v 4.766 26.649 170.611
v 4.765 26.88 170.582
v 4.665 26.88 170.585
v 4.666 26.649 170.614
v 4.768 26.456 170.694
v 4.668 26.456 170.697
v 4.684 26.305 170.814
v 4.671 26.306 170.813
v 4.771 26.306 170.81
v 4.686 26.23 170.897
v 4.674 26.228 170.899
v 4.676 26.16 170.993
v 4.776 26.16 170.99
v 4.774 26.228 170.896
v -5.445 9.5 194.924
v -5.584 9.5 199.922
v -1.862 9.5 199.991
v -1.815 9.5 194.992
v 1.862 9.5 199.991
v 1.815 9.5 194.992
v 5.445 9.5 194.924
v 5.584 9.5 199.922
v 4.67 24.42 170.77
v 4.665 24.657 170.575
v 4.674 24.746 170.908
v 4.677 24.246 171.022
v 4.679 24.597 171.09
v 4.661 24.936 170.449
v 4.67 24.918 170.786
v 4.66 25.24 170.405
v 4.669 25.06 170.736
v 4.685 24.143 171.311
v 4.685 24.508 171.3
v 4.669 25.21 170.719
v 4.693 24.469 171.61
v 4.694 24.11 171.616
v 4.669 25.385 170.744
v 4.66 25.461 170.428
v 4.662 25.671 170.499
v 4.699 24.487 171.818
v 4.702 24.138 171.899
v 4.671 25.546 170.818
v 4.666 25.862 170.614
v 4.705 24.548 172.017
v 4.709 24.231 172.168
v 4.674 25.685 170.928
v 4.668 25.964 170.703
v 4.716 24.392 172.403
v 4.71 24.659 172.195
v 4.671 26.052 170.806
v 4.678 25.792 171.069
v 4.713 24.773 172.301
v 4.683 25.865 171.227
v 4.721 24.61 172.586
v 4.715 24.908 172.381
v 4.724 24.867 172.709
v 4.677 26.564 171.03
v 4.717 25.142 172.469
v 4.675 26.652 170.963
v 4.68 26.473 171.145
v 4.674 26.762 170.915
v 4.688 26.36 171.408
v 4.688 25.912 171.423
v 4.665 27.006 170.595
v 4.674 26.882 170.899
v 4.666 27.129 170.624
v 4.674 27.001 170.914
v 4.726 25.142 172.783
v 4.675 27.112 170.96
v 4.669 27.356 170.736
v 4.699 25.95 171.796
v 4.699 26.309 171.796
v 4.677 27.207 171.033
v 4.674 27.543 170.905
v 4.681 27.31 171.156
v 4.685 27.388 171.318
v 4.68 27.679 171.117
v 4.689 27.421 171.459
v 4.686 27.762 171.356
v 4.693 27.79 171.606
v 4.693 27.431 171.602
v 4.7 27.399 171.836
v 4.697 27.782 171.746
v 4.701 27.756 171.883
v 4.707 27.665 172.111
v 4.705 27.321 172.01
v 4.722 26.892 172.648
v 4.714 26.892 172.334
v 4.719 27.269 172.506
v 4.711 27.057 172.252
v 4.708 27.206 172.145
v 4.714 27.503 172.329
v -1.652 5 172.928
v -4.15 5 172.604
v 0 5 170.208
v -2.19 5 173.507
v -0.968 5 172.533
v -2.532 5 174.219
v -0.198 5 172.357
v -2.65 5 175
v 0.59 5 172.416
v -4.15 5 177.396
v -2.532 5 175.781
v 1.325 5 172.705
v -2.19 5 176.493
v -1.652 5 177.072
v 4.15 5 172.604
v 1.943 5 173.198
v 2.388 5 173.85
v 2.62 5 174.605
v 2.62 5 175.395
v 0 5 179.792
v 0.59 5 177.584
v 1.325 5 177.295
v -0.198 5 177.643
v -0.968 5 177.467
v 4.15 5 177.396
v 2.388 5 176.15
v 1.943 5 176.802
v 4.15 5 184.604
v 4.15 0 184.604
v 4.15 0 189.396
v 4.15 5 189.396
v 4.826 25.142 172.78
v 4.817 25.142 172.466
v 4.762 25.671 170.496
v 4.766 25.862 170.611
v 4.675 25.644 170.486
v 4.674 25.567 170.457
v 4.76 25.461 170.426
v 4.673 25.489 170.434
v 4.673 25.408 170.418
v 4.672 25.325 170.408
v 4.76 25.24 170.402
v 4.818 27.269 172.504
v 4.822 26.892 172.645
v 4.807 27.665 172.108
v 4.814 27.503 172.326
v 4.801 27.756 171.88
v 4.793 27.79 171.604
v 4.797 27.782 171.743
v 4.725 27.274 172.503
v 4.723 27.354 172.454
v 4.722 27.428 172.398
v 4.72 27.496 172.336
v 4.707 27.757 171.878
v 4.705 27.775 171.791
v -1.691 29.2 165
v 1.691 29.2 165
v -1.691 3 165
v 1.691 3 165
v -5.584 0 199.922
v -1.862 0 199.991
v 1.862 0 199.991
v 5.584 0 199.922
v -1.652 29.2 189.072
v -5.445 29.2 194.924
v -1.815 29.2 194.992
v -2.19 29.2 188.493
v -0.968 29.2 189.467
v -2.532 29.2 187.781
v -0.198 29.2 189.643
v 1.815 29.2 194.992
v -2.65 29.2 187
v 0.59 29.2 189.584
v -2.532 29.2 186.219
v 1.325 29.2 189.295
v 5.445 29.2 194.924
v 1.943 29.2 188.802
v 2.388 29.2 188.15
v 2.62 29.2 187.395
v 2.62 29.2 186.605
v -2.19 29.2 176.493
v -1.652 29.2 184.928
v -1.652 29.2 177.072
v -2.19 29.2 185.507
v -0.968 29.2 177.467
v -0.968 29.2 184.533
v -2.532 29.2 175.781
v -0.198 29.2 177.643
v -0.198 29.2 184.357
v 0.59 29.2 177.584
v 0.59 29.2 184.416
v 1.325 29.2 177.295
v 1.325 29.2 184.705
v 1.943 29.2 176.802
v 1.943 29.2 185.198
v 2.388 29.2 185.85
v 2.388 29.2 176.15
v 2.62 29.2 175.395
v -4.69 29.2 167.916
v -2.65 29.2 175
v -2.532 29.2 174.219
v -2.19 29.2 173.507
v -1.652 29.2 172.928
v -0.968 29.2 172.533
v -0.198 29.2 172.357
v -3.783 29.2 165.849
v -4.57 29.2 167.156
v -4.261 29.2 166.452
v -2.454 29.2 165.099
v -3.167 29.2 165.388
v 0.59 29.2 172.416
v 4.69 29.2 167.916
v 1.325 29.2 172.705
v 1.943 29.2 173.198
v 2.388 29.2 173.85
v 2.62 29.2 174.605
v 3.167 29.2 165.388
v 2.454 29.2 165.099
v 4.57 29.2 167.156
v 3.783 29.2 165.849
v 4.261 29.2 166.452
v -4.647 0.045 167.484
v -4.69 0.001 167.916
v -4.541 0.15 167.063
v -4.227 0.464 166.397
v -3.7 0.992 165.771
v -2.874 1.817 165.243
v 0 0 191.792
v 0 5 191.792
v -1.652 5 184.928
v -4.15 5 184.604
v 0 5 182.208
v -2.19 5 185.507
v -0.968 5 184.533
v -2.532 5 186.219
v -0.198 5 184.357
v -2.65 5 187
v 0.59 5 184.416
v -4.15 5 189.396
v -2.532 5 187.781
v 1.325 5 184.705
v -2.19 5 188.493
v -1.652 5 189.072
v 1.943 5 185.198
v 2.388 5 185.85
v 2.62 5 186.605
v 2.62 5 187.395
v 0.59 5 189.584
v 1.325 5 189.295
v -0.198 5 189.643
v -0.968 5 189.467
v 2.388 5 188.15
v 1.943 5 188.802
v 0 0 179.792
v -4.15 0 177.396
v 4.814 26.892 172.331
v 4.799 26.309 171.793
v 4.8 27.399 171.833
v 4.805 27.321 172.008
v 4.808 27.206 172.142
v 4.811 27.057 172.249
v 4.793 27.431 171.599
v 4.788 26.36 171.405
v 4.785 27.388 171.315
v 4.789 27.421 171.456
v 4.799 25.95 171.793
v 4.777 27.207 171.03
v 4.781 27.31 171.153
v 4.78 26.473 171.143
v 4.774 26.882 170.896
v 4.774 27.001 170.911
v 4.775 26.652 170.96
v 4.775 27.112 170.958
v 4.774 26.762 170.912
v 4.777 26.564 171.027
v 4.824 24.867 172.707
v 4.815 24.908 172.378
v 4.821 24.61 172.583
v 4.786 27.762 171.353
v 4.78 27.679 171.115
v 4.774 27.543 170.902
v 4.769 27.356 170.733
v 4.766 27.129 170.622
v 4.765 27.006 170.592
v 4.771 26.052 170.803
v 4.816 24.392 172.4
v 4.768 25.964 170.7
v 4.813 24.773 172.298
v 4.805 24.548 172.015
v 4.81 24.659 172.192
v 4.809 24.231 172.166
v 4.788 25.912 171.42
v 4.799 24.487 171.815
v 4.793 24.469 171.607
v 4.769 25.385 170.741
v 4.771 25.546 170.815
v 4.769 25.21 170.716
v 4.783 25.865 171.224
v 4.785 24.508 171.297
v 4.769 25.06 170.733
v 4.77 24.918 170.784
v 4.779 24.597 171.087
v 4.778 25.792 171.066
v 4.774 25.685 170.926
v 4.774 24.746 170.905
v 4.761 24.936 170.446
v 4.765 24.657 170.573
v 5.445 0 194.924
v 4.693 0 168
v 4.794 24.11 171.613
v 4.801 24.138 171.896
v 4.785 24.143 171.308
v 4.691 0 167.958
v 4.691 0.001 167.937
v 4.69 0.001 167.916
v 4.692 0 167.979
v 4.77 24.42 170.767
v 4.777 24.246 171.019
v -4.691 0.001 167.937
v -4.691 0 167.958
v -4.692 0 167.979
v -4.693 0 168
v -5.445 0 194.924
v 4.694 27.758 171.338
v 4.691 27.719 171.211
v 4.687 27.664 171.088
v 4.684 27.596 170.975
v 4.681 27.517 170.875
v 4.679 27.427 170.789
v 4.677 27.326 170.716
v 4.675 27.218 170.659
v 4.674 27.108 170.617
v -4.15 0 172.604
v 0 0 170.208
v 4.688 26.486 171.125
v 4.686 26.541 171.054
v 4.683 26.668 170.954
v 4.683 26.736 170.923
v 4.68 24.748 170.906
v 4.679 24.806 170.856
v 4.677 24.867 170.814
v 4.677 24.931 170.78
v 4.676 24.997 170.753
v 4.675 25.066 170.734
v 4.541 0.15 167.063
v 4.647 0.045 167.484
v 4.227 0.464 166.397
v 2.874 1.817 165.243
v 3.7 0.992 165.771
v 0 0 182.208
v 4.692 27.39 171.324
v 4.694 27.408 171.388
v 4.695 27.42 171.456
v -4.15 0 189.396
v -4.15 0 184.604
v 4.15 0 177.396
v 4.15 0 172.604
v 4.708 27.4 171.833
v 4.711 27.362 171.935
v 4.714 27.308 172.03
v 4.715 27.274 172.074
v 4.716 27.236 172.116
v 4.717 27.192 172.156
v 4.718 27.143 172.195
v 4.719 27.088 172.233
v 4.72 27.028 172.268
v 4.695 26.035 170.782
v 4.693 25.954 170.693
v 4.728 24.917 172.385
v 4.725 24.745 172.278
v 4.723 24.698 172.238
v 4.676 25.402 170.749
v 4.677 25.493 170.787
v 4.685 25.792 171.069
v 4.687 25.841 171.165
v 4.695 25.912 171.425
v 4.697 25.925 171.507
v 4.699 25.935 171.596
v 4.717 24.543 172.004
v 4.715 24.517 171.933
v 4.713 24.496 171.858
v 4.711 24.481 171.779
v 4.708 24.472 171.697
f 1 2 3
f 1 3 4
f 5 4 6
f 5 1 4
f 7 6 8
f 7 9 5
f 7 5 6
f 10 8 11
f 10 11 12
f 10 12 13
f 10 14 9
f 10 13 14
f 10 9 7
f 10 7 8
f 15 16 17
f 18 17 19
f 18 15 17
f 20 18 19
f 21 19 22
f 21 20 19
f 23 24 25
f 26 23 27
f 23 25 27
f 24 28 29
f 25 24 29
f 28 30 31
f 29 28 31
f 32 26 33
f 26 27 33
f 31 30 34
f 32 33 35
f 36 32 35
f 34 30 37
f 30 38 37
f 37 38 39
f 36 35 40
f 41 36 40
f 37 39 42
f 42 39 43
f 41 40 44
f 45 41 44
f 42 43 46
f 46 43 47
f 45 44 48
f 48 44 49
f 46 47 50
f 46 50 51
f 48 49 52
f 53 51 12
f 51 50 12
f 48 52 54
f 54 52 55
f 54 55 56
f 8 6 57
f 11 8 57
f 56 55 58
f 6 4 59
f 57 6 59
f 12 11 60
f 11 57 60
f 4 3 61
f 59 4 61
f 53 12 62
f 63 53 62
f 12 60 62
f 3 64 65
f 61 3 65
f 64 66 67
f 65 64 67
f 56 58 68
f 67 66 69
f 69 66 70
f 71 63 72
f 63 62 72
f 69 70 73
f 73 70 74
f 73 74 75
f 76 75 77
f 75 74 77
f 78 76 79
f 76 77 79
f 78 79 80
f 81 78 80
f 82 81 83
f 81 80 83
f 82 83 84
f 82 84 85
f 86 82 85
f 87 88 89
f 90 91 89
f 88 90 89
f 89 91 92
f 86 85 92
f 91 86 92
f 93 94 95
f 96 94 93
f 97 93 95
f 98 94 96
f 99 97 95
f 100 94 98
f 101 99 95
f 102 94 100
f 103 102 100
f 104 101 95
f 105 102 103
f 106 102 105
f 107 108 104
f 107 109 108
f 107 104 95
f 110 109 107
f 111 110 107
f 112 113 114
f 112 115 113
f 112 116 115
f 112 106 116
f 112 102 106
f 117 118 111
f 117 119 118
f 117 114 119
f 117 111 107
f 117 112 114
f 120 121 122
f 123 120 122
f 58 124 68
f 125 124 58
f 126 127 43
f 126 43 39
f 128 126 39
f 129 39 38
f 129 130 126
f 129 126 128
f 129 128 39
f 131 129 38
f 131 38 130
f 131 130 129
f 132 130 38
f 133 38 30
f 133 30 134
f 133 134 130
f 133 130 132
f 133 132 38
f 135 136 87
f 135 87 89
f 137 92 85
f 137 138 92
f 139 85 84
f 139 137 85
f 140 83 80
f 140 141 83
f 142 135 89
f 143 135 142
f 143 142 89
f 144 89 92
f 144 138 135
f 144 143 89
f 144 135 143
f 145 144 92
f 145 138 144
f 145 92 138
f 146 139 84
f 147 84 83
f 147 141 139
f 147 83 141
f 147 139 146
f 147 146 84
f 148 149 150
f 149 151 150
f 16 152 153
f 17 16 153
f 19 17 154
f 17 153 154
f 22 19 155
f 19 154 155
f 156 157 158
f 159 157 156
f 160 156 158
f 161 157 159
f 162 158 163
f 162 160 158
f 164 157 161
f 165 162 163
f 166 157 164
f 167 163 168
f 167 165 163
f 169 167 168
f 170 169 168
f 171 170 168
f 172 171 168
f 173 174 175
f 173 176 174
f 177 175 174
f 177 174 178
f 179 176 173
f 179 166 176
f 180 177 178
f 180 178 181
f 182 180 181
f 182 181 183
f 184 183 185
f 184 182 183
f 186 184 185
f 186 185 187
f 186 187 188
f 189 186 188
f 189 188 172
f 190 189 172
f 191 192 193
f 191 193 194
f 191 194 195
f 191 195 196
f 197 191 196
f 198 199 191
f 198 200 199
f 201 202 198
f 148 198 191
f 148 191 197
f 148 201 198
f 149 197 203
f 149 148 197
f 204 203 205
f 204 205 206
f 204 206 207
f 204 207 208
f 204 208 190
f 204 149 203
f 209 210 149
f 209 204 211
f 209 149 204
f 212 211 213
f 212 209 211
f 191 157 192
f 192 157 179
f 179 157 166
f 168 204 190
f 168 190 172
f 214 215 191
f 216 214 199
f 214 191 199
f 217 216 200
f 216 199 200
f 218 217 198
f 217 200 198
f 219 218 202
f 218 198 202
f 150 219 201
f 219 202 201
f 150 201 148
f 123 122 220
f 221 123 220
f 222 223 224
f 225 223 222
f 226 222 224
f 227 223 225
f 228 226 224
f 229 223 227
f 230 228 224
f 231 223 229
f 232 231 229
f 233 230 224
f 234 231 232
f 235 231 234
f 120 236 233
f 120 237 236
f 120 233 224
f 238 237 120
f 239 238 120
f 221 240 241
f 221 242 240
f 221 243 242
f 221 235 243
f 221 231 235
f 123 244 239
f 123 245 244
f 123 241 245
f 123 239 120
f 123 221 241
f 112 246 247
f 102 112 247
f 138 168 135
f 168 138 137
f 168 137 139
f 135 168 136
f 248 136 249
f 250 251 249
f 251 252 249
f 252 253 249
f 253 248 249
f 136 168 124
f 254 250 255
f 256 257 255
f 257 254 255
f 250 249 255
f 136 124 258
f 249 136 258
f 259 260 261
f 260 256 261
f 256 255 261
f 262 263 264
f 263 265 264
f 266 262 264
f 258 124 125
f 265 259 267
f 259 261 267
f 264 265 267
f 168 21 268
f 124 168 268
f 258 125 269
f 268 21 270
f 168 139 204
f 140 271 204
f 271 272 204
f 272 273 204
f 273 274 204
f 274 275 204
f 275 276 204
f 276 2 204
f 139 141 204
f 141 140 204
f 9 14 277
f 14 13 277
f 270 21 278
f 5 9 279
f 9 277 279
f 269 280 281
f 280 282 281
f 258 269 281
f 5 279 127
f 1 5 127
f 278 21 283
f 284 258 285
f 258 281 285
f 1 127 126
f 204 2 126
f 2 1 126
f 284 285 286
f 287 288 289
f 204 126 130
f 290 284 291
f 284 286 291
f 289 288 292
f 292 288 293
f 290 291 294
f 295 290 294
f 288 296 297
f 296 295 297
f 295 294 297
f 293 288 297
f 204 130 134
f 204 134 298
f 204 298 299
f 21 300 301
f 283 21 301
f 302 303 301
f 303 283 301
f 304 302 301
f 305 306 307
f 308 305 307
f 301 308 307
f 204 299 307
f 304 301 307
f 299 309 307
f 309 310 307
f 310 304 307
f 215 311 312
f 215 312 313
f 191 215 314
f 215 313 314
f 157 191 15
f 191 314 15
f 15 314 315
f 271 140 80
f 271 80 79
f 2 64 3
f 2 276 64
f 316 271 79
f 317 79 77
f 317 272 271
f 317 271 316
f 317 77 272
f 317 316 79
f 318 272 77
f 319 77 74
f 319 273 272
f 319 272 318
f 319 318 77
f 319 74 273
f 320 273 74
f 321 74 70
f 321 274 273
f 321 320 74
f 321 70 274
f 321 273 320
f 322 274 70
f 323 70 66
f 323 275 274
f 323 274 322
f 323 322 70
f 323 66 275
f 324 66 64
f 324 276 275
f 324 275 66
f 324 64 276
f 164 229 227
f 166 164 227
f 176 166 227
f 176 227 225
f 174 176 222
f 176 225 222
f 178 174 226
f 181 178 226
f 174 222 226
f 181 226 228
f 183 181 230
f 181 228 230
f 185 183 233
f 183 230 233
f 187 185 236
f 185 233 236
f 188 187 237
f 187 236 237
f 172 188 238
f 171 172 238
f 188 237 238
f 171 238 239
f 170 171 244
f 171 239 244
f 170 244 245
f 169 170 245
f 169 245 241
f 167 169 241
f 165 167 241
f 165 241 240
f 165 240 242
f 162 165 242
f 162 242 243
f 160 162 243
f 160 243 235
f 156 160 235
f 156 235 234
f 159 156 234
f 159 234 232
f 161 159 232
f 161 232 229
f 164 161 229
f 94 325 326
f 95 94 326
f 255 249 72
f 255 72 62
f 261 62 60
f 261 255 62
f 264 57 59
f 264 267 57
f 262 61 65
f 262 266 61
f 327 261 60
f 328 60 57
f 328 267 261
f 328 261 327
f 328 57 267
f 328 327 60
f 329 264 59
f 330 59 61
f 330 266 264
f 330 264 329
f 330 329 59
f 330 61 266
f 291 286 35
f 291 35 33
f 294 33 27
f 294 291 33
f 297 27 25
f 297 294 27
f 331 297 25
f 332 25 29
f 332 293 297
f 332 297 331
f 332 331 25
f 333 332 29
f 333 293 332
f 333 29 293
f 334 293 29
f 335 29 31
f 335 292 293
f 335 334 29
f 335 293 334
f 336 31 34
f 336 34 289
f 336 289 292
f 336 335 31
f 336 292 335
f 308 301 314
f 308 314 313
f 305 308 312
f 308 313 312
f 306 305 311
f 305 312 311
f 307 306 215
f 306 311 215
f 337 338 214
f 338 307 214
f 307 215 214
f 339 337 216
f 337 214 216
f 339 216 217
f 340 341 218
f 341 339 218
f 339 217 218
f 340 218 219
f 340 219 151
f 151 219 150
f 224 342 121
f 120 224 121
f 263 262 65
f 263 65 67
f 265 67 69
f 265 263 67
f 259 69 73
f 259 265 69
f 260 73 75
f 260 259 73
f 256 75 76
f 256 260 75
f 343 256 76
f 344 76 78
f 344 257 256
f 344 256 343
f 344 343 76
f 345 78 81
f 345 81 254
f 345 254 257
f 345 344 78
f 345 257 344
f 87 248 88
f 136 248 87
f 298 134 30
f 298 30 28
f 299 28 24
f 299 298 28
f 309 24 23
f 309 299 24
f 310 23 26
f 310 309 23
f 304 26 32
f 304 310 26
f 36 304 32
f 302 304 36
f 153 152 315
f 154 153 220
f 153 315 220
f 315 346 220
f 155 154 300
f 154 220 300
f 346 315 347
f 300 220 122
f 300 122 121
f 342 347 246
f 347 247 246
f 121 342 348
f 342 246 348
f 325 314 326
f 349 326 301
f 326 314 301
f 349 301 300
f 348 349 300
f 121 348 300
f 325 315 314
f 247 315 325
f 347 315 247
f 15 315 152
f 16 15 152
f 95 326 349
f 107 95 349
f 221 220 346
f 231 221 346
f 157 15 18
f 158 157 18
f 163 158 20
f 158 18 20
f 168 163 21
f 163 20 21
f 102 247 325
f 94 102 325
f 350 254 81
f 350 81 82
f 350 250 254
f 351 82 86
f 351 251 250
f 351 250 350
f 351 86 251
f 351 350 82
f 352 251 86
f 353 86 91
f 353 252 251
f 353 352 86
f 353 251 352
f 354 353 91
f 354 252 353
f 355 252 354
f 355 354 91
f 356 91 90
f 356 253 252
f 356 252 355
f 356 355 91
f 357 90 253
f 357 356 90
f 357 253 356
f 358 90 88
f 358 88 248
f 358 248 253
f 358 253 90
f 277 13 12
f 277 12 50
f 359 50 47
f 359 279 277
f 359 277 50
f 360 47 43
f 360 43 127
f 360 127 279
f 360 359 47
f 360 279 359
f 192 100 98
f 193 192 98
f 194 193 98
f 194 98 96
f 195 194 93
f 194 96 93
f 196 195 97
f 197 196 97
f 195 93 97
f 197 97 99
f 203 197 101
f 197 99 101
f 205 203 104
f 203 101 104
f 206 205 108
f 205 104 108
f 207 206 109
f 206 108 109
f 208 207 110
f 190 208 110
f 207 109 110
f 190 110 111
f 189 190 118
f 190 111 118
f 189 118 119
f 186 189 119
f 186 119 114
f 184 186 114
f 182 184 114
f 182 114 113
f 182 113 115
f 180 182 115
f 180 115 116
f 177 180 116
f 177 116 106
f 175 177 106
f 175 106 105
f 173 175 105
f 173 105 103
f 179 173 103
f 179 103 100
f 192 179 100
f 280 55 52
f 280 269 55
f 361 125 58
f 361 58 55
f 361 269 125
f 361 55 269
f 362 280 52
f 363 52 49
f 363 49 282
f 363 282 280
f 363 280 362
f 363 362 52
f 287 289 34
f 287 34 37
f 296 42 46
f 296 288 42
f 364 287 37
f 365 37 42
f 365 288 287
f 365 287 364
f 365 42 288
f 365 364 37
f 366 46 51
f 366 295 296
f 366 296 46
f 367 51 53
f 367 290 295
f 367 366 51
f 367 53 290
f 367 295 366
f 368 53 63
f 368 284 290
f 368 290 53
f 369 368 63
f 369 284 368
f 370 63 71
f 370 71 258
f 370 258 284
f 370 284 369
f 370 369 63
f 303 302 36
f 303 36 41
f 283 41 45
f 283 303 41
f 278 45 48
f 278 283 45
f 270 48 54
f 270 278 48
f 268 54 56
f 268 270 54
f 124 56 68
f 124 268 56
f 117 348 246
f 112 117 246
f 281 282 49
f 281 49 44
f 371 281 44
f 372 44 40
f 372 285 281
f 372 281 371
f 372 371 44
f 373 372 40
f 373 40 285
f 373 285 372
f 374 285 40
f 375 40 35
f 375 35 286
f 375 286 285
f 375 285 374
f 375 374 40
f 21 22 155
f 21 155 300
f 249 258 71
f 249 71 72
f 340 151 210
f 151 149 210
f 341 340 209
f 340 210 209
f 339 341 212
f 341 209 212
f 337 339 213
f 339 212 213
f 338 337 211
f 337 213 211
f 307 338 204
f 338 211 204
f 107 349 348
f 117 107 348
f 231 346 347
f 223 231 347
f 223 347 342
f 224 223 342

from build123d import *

# Parameters (mm, degrees)
EXTRUDE_590_DEPTH   = 29.2
EXTRUDE_638_DEPTH   = 9.5
FILLET_1_R          = 3
HOLE_WIZARD_M5_1_D  = 5.3
CUT_EXTRUDE_1_DEPTH = 5
CUT_EXTRUDE_2_DEPTH = 0.1


with BuildPart() as part:
    # 草图1 → Extrude 590 (new body)
    with BuildSketch(Plane(origin=(0, 0, 0), x_dir=(1, 0, 0), z_dir=(0, 1, 0))):
        with BuildLine():
            Line((4.608867317, -165), (-4.608867317, -165))
            Line((-4.608867317, -165), (-5.444719551, -194.923972433))
            ThreePointArc((-5.444719551, -194.923972433), (0, -195), (5.444719551, -194.923972433))
            Line((5.444719551, -194.923972433), (4.608867317, -165))
        make_face()
    extrude(amount=EXTRUDE_590_DEPTH)

    # 草图1<3> → Extrude 638 (add)
    with BuildSketch(Plane(origin=(0, 0, 0), x_dir=(1, 0, 0), z_dir=(0, 1, 0))):
        with BuildLine():
            ThreePointArc((5.444719551, -194.923972433), (0, -195), (-5.444719551, -194.923972433))
            Line((-5.444719551, -194.923972433), (-5.584327745, -199.922023008))
            ThreePointArc((-5.584327745, -199.922023008), (0, -200), (5.584327745, -199.922023008))
            Line((5.584327745, -199.922023008), (5.444719551, -194.923972433))
        make_face()
    extrude(amount=EXTRUDE_638_DEPTH)

    # 圆角1
    fillet_1_edges = [part.edges().sort_by_distance(p)[0] for p in [
        (4.608867317, 14.6, 165),
        (0, 0, 165),
        (-4.608867317, 14.6, 165),
    ]]
    fillet(fillet_1_edges, radius=FILLET_1_R)

    # M5 间隙孔1 (through all)
    with Locations(Plane(origin=(0, 29.2, 0), x_dir=(1, 0, 0), z_dir=(0, 1, 0))):
        with Locations((0, -187), (0, -175)):
            Hole(HOLE_WIZARD_M5_1_D / 2)

    # 草图6 → 切除-拉伸1 (cut)
    with BuildSketch(Plane.XZ):
        Polygon((0, 179.792007234), (-4.15, 177.396003617), (-4.15, 172.603996383), (0, 170.207992766), (4.15, 172.603996383), (4.15, 177.396003617), align=None)
        Polygon((0, 191.792007234), (-4.15, 189.396003617), (-4.15, 184.603996383), (0, 182.207992766), (4.15, 184.603996383), (4.15, 189.396003617), align=None)
    extrude(amount=-CUT_EXTRUDE_1_DEPTH, mode=Mode.SUBTRACT)

    # 草图7 → 切除-拉伸2 (cut)
    with BuildSketch(Plane(origin=(0, 0, 0), x_dir=(-0.02792163872356911, 0, -0.9996101150403545), z_dir=(0.9996101150403545, 0, -0.02792163872356911))):
        with BuildLine():
            Line((-172.3983953, 26.892307692), (-172.712497864, 26.892307692))
            add(Edge.make_bspline(
                [(-172.712497864, 26.892307692), (-172.703988313, 26.927540176), (-172.687352838, 26.996416801), (-172.652655264, 27.094824062), (-172.614856009, 27.187947583), (-172.569466905, 27.274043657), (-172.51995815, 27.354842559), (-172.463235429, 27.428511684), (-172.401915706, 27.496924649), (-172.334090757, 27.557637887), (-172.262962095, 27.612615616), (-172.187527476, 27.659490673), (-172.109304582, 27.699814826), (-172.027751449, 27.733035058), (-171.942625277, 27.758060582), (-171.854695654, 27.776217387), (-171.763732154, 27.788008502), (-171.701984563, 27.789159265), (-171.670630877, 27.78974359)],
                knots=[0, 0, 0, 0, 1.162005537, 2.271625781, 3.343758855, 4.383309926, 5.390229558, 6.379919256, 7.361854164, 8.333198761, 9.295911338, 10.242430842, 11.177959212, 12.116337295, 13.062827104, 14.020064771, 14.994644689, 16, 16, 16, 16], degree=3))
            add(Edge.make_bspline(
                [(-171.670630877, 27.78974359), (-171.624948135, 27.788364359), (-171.534579124, 27.785635984), (-171.401816077, 27.760721548), (-171.273789258, 27.721296415), (-171.15190001, 27.666822688), (-171.038681577, 27.599635375), (-170.937945391, 27.519670638), (-170.85105688, 27.428471337), (-170.778162502, 27.327738772), (-170.721087503, 27.220083263), (-170.67900113, 27.109283106), (-170.653379449, 26.995601134), (-170.650058892, 26.918843855), (-170.6483953, 26.880388622)],
                knots=[0, 0, 0, 0, 1.083050992, 2.142477498, 3.193116406, 4.255571735, 5.30263384, 6.308962982, 7.297363603, 8.282367274, 9.249857812, 10.179914175, 11.08814088, 12, 12, 12, 12], degree=3))
            add(Edge.make_bspline(
                [(-170.6483953, 26.880388622), (-170.649558891, 26.843381827), (-170.651835858, 26.770965273), (-170.671169564, 26.665243775), (-170.703705827, 26.565602175), (-170.748775589, 26.471621013), (-170.807117139, 26.383896173), (-170.877789836, 26.302230282), (-170.961292498, 26.226261124), (-171.024571436, 26.182741651), (-171.057149306, 26.160336538)],
                knots=[0, 0, 0, 0, 1.024540389, 2.004866551, 2.965041327, 3.920577974, 4.882998113, 5.874504559, 6.905732034, 8, 8, 8, 8], degree=3))
            add(Edge.make_bspline(
                [(-171.057149306, 26.160336538), (-171.019917552, 26.142358367), (-170.946150678, 26.106738409), (-170.845600148, 26.036882652), (-170.754322273, 25.956226304), (-170.703418554, 25.893283652), (-170.677842415, 25.861658654)],
                knots=[0, 0, 0, 0, 1.015518401, 2.012035669, 3.001164323, 4, 4, 4, 4], degree=3))
            add(Edge.make_bspline(
                [(-170.677842415, 25.861658654), (-170.661001073, 25.838600902), (-170.627594177, 25.792862986), (-170.586358643, 25.71932656), (-170.548949529, 25.644975071), (-170.51979931, 25.567815664), (-170.497225443, 25.488742651), (-170.48108941, 25.407620255), (-170.47106527, 25.324382232), (-170.469629718, 25.268069752), (-170.46890812, 25.239763622)],
                knots=[0, 0, 0, 0, 1.025084078, 2.033381695, 3.024893161, 4.013698104, 4.991890475, 5.976764909, 6.982997093, 8, 8, 8, 8], degree=3))
            add(Edge.make_bspline(
                [(-170.46890812, 25.239763622), (-170.470702634, 25.190753901), (-170.474283216, 25.092965099), (-170.50628729, 24.948490377), (-170.555900531, 24.807264875), (-170.626357467, 24.672190036), (-170.712224976, 24.545809655), (-170.8143823, 24.432733346), (-170.931668708, 24.335534741), (-171.062474357, 24.254324513), (-171.204191486, 24.189406591), (-171.355767078, 24.144349148), (-171.515017132, 24.115003148), (-171.624224429, 24.11185628), (-171.67974546, 24.11025641)],
                knots=[0, 0, 0, 0, 0.955779014, 1.907060117, 2.875433937, 3.871313158, 4.872415639, 5.851225146, 6.836215519, 7.83643374, 8.849228613, 9.86973379, 10.916971861, 12, 12, 12, 12], degree=3))
            add(Edge.make_bspline(
                [(-171.67974546, 24.11025641), (-171.717164761, 24.111124624), (-171.790793466, 24.112832978), (-171.899036964, 24.124511579), (-172.002358663, 24.145841584), (-172.100898261, 24.174544889), (-172.194743298, 24.210936632), (-172.283607403, 24.25625533), (-172.368037296, 24.309566832), (-172.447236247, 24.371500419), (-172.521194815, 24.440781759), (-172.587947539, 24.518640769), (-172.648607332, 24.603638173), (-172.701549971, 24.696761229), (-172.749186924, 24.796806487), (-172.78836788, 24.905054985), (-172.822853449, 25.020539007), (-172.838886913, 25.101016747), (-172.847113249, 25.142307692)],
                knots=[0, 0, 0, 0, 1.048658725, 2.063410685, 3.046034179, 4.001477787, 4.936774919, 5.862367409, 6.792675028, 7.730719943, 8.675894397, 9.627829632, 10.600096036, 11.597688215, 12.626045268, 13.701542398, 14.82072376, 16, 16, 16, 16], degree=3))
            Line((-172.847113249, 25.142307692), (-172.533010685, 25.142307692))
            add(Edge.make_bspline(
                [(-172.533010685, 25.142307692), (-172.524827393, 25.115358679), (-172.508910181, 25.062940507), (-172.481815882, 24.987500202), (-172.45094761, 24.918342149), (-172.417833052, 24.854959027), (-172.383054606, 24.796726624), (-172.344139681, 24.745184755), (-172.303970535, 24.698069553), (-172.273691182, 24.671524941), (-172.258872063, 24.658533654)],
                knots=[0, 0, 0, 0, 1.198163088, 2.33053128, 3.407730985, 4.417276592, 5.372219308, 6.28897303, 7.162600585, 8, 8, 8, 8], degree=3))
            add(Edge.make_bspline(
                [(-172.258872063, 24.658533654), (-172.239275486, 24.64342532), (-172.200142823, 24.613255288), (-172.136374592, 24.57475366), (-172.069309706, 24.541392634), (-171.997495032, 24.515908939), (-171.922480262, 24.494331278), (-171.843052896, 24.480210759), (-171.759913679, 24.470522587), (-171.703145916, 24.469667656), (-171.674136486, 24.469230769)],
                knots=[0, 0, 0, 0, 0.946170439, 1.889420265, 2.845303464, 3.807233317, 4.801018734, 5.828864929, 6.890507805, 8, 8, 8, 8], degree=3))
            add(Edge.make_bspline(
                [(-171.674136486, 24.469230769), (-171.641382983, 24.469846674), (-171.577336336, 24.471051024), (-171.483881477, 24.482126731), (-171.394974029, 24.498257144), (-171.311601104, 24.523170127), (-171.232670596, 24.553950979), (-171.159288947, 24.592599384), (-171.09049284, 24.637944106), (-171.027163435, 24.689483264), (-170.970217928, 24.745904759), (-170.920078414, 24.80491783), (-170.877453753, 24.86627366), (-170.843070175, 24.930311781), (-170.815919624, 24.99676701), (-170.797436424, 25.065825839), (-170.784584909, 25.136923105), (-170.783538296, 25.185252074), (-170.783010685, 25.209615385)],
                knots=[0, 0, 0, 0, 1.217147791, 2.380027433, 3.494444702, 4.572153297, 5.609568379, 6.639424714, 7.649109417, 8.668170816, 9.669597737, 10.625200337, 11.543417969, 12.441394052, 13.322311151, 14.205496177, 15.095365482, 16, 16, 16, 16], degree=3))
            add(Edge.make_bspline(
                [(-170.783010685, 25.209615385), (-170.784540986, 25.242226723), (-170.787593975, 25.307287132), (-170.810902554, 25.403004706), (-170.849241418, 25.495228118), (-170.90291393, 25.582383909), (-170.968249658, 25.66315981), (-171.044614565, 25.735231293), (-171.132642793, 25.794701384), (-171.213662662, 25.83579004), (-171.285427819, 25.863827115), (-171.346843203, 25.88250208), (-171.415599807, 25.898315735), (-171.490866156, 25.913028007), (-171.573209372, 25.925549355), (-171.66253981, 25.935991171), (-171.758875572, 25.944346212), (-171.825566738, 25.948077307), (-171.859933762, 25.95)],
                knots=[0, 0, 0, 0, 1.07054697, 2.135767047, 3.216561865, 4.33974944, 5.486079747, 6.621378074, 7.775625952, 8.963672916, 9.598146892, 10.304877434, 11.070270905, 11.915000392, 12.823868403, 13.805723172, 14.86925407, 16, 16, 16, 16], degree=3))
            Line((-171.859933762, 25.95), (-171.859933762, 26.308974359))
            add(Edge.make_bspline(
                [(-171.859933762, 26.308974359), (-171.816632596, 26.309709163), (-171.731816249, 26.311148463), (-171.607921944, 26.328556473), (-171.489448632, 26.352637101), (-171.37902189, 26.389522293), (-171.278373177, 26.43236259), (-171.191053575, 26.4822148), (-171.118286428, 26.537629549), (-171.060425356, 26.599462158), (-171.016896128, 26.665777206), (-170.98506933, 26.734893864), (-170.966269004, 26.807417924), (-170.963759337, 26.856912592), (-170.962497864, 26.881790865)],
                knots=[0, 0, 0, 0, 1.321986639, 2.589447074, 3.816329219, 5.01088745, 6.139805852, 7.153945165, 8.075214402, 8.924034688, 9.728124013, 10.488707548, 11.240355623, 12, 12, 12, 12], degree=3))
            add(Edge.make_bspline(
                [(-170.962497864, 26.881790865), (-170.962912275, 26.900068611), (-170.963736726, 26.936431318), (-170.974134004, 26.989556386), (-170.989758045, 27.041057332), (-171.011237774, 27.090715142), (-171.039987973, 27.138185416), (-171.074393959, 27.183872865), (-171.11536206, 27.227516644), (-171.162307507, 27.268196964), (-171.212719312, 27.306966201), (-171.267969087, 27.339879838), (-171.326390961, 27.3680249), (-171.388049616, 27.391234402), (-171.453145146, 27.40869369), (-171.521371704, 27.421229532), (-171.592859388, 27.429067187), (-171.64163112, 27.430195602), (-171.666424146, 27.430769231)],
                knots=[0, 0, 0, 0, 0.884392785, 1.759457502, 2.611959086, 3.489218968, 4.37281399, 5.2945488, 6.255912374, 7.266815255, 8.301784654, 9.332968512, 10.37626691, 11.440494194, 12.520033166, 13.637162961, 14.798855837, 16, 16, 16, 16], degree=3))
            add(Edge.make_bspline(
                [(-171.666424146, 27.430769231), (-171.706275814, 27.429377869), (-171.784115391, 27.426660215), (-171.896330307, 27.402857202), (-172.000649641, 27.364879118), (-172.080388308, 27.319546099), (-172.139270882, 27.274795665), (-172.18134782, 27.235713279), (-172.222668331, 27.192280455), (-172.260514008, 27.14182208), (-172.298787984, 27.087755289), (-172.333632546, 27.027331608), (-172.367492238, 26.962127214), (-172.387894788, 26.916031579), (-172.3983953, 26.892307692)],
                knots=[0, 0, 0, 0, 1.472543308, 2.876219568, 4.221790263, 5.565193594, 6.249813518, 6.953379497, 7.687249741, 8.463570142, 9.283606569, 10.136032583, 11.040678096, 12, 12, 12, 12], degree=3))
        make_face()
    extrude(amount=-CUT_EXTRUDE_2_DEPTH, mode=Mode.SUBTRACT)


solid = part.part
